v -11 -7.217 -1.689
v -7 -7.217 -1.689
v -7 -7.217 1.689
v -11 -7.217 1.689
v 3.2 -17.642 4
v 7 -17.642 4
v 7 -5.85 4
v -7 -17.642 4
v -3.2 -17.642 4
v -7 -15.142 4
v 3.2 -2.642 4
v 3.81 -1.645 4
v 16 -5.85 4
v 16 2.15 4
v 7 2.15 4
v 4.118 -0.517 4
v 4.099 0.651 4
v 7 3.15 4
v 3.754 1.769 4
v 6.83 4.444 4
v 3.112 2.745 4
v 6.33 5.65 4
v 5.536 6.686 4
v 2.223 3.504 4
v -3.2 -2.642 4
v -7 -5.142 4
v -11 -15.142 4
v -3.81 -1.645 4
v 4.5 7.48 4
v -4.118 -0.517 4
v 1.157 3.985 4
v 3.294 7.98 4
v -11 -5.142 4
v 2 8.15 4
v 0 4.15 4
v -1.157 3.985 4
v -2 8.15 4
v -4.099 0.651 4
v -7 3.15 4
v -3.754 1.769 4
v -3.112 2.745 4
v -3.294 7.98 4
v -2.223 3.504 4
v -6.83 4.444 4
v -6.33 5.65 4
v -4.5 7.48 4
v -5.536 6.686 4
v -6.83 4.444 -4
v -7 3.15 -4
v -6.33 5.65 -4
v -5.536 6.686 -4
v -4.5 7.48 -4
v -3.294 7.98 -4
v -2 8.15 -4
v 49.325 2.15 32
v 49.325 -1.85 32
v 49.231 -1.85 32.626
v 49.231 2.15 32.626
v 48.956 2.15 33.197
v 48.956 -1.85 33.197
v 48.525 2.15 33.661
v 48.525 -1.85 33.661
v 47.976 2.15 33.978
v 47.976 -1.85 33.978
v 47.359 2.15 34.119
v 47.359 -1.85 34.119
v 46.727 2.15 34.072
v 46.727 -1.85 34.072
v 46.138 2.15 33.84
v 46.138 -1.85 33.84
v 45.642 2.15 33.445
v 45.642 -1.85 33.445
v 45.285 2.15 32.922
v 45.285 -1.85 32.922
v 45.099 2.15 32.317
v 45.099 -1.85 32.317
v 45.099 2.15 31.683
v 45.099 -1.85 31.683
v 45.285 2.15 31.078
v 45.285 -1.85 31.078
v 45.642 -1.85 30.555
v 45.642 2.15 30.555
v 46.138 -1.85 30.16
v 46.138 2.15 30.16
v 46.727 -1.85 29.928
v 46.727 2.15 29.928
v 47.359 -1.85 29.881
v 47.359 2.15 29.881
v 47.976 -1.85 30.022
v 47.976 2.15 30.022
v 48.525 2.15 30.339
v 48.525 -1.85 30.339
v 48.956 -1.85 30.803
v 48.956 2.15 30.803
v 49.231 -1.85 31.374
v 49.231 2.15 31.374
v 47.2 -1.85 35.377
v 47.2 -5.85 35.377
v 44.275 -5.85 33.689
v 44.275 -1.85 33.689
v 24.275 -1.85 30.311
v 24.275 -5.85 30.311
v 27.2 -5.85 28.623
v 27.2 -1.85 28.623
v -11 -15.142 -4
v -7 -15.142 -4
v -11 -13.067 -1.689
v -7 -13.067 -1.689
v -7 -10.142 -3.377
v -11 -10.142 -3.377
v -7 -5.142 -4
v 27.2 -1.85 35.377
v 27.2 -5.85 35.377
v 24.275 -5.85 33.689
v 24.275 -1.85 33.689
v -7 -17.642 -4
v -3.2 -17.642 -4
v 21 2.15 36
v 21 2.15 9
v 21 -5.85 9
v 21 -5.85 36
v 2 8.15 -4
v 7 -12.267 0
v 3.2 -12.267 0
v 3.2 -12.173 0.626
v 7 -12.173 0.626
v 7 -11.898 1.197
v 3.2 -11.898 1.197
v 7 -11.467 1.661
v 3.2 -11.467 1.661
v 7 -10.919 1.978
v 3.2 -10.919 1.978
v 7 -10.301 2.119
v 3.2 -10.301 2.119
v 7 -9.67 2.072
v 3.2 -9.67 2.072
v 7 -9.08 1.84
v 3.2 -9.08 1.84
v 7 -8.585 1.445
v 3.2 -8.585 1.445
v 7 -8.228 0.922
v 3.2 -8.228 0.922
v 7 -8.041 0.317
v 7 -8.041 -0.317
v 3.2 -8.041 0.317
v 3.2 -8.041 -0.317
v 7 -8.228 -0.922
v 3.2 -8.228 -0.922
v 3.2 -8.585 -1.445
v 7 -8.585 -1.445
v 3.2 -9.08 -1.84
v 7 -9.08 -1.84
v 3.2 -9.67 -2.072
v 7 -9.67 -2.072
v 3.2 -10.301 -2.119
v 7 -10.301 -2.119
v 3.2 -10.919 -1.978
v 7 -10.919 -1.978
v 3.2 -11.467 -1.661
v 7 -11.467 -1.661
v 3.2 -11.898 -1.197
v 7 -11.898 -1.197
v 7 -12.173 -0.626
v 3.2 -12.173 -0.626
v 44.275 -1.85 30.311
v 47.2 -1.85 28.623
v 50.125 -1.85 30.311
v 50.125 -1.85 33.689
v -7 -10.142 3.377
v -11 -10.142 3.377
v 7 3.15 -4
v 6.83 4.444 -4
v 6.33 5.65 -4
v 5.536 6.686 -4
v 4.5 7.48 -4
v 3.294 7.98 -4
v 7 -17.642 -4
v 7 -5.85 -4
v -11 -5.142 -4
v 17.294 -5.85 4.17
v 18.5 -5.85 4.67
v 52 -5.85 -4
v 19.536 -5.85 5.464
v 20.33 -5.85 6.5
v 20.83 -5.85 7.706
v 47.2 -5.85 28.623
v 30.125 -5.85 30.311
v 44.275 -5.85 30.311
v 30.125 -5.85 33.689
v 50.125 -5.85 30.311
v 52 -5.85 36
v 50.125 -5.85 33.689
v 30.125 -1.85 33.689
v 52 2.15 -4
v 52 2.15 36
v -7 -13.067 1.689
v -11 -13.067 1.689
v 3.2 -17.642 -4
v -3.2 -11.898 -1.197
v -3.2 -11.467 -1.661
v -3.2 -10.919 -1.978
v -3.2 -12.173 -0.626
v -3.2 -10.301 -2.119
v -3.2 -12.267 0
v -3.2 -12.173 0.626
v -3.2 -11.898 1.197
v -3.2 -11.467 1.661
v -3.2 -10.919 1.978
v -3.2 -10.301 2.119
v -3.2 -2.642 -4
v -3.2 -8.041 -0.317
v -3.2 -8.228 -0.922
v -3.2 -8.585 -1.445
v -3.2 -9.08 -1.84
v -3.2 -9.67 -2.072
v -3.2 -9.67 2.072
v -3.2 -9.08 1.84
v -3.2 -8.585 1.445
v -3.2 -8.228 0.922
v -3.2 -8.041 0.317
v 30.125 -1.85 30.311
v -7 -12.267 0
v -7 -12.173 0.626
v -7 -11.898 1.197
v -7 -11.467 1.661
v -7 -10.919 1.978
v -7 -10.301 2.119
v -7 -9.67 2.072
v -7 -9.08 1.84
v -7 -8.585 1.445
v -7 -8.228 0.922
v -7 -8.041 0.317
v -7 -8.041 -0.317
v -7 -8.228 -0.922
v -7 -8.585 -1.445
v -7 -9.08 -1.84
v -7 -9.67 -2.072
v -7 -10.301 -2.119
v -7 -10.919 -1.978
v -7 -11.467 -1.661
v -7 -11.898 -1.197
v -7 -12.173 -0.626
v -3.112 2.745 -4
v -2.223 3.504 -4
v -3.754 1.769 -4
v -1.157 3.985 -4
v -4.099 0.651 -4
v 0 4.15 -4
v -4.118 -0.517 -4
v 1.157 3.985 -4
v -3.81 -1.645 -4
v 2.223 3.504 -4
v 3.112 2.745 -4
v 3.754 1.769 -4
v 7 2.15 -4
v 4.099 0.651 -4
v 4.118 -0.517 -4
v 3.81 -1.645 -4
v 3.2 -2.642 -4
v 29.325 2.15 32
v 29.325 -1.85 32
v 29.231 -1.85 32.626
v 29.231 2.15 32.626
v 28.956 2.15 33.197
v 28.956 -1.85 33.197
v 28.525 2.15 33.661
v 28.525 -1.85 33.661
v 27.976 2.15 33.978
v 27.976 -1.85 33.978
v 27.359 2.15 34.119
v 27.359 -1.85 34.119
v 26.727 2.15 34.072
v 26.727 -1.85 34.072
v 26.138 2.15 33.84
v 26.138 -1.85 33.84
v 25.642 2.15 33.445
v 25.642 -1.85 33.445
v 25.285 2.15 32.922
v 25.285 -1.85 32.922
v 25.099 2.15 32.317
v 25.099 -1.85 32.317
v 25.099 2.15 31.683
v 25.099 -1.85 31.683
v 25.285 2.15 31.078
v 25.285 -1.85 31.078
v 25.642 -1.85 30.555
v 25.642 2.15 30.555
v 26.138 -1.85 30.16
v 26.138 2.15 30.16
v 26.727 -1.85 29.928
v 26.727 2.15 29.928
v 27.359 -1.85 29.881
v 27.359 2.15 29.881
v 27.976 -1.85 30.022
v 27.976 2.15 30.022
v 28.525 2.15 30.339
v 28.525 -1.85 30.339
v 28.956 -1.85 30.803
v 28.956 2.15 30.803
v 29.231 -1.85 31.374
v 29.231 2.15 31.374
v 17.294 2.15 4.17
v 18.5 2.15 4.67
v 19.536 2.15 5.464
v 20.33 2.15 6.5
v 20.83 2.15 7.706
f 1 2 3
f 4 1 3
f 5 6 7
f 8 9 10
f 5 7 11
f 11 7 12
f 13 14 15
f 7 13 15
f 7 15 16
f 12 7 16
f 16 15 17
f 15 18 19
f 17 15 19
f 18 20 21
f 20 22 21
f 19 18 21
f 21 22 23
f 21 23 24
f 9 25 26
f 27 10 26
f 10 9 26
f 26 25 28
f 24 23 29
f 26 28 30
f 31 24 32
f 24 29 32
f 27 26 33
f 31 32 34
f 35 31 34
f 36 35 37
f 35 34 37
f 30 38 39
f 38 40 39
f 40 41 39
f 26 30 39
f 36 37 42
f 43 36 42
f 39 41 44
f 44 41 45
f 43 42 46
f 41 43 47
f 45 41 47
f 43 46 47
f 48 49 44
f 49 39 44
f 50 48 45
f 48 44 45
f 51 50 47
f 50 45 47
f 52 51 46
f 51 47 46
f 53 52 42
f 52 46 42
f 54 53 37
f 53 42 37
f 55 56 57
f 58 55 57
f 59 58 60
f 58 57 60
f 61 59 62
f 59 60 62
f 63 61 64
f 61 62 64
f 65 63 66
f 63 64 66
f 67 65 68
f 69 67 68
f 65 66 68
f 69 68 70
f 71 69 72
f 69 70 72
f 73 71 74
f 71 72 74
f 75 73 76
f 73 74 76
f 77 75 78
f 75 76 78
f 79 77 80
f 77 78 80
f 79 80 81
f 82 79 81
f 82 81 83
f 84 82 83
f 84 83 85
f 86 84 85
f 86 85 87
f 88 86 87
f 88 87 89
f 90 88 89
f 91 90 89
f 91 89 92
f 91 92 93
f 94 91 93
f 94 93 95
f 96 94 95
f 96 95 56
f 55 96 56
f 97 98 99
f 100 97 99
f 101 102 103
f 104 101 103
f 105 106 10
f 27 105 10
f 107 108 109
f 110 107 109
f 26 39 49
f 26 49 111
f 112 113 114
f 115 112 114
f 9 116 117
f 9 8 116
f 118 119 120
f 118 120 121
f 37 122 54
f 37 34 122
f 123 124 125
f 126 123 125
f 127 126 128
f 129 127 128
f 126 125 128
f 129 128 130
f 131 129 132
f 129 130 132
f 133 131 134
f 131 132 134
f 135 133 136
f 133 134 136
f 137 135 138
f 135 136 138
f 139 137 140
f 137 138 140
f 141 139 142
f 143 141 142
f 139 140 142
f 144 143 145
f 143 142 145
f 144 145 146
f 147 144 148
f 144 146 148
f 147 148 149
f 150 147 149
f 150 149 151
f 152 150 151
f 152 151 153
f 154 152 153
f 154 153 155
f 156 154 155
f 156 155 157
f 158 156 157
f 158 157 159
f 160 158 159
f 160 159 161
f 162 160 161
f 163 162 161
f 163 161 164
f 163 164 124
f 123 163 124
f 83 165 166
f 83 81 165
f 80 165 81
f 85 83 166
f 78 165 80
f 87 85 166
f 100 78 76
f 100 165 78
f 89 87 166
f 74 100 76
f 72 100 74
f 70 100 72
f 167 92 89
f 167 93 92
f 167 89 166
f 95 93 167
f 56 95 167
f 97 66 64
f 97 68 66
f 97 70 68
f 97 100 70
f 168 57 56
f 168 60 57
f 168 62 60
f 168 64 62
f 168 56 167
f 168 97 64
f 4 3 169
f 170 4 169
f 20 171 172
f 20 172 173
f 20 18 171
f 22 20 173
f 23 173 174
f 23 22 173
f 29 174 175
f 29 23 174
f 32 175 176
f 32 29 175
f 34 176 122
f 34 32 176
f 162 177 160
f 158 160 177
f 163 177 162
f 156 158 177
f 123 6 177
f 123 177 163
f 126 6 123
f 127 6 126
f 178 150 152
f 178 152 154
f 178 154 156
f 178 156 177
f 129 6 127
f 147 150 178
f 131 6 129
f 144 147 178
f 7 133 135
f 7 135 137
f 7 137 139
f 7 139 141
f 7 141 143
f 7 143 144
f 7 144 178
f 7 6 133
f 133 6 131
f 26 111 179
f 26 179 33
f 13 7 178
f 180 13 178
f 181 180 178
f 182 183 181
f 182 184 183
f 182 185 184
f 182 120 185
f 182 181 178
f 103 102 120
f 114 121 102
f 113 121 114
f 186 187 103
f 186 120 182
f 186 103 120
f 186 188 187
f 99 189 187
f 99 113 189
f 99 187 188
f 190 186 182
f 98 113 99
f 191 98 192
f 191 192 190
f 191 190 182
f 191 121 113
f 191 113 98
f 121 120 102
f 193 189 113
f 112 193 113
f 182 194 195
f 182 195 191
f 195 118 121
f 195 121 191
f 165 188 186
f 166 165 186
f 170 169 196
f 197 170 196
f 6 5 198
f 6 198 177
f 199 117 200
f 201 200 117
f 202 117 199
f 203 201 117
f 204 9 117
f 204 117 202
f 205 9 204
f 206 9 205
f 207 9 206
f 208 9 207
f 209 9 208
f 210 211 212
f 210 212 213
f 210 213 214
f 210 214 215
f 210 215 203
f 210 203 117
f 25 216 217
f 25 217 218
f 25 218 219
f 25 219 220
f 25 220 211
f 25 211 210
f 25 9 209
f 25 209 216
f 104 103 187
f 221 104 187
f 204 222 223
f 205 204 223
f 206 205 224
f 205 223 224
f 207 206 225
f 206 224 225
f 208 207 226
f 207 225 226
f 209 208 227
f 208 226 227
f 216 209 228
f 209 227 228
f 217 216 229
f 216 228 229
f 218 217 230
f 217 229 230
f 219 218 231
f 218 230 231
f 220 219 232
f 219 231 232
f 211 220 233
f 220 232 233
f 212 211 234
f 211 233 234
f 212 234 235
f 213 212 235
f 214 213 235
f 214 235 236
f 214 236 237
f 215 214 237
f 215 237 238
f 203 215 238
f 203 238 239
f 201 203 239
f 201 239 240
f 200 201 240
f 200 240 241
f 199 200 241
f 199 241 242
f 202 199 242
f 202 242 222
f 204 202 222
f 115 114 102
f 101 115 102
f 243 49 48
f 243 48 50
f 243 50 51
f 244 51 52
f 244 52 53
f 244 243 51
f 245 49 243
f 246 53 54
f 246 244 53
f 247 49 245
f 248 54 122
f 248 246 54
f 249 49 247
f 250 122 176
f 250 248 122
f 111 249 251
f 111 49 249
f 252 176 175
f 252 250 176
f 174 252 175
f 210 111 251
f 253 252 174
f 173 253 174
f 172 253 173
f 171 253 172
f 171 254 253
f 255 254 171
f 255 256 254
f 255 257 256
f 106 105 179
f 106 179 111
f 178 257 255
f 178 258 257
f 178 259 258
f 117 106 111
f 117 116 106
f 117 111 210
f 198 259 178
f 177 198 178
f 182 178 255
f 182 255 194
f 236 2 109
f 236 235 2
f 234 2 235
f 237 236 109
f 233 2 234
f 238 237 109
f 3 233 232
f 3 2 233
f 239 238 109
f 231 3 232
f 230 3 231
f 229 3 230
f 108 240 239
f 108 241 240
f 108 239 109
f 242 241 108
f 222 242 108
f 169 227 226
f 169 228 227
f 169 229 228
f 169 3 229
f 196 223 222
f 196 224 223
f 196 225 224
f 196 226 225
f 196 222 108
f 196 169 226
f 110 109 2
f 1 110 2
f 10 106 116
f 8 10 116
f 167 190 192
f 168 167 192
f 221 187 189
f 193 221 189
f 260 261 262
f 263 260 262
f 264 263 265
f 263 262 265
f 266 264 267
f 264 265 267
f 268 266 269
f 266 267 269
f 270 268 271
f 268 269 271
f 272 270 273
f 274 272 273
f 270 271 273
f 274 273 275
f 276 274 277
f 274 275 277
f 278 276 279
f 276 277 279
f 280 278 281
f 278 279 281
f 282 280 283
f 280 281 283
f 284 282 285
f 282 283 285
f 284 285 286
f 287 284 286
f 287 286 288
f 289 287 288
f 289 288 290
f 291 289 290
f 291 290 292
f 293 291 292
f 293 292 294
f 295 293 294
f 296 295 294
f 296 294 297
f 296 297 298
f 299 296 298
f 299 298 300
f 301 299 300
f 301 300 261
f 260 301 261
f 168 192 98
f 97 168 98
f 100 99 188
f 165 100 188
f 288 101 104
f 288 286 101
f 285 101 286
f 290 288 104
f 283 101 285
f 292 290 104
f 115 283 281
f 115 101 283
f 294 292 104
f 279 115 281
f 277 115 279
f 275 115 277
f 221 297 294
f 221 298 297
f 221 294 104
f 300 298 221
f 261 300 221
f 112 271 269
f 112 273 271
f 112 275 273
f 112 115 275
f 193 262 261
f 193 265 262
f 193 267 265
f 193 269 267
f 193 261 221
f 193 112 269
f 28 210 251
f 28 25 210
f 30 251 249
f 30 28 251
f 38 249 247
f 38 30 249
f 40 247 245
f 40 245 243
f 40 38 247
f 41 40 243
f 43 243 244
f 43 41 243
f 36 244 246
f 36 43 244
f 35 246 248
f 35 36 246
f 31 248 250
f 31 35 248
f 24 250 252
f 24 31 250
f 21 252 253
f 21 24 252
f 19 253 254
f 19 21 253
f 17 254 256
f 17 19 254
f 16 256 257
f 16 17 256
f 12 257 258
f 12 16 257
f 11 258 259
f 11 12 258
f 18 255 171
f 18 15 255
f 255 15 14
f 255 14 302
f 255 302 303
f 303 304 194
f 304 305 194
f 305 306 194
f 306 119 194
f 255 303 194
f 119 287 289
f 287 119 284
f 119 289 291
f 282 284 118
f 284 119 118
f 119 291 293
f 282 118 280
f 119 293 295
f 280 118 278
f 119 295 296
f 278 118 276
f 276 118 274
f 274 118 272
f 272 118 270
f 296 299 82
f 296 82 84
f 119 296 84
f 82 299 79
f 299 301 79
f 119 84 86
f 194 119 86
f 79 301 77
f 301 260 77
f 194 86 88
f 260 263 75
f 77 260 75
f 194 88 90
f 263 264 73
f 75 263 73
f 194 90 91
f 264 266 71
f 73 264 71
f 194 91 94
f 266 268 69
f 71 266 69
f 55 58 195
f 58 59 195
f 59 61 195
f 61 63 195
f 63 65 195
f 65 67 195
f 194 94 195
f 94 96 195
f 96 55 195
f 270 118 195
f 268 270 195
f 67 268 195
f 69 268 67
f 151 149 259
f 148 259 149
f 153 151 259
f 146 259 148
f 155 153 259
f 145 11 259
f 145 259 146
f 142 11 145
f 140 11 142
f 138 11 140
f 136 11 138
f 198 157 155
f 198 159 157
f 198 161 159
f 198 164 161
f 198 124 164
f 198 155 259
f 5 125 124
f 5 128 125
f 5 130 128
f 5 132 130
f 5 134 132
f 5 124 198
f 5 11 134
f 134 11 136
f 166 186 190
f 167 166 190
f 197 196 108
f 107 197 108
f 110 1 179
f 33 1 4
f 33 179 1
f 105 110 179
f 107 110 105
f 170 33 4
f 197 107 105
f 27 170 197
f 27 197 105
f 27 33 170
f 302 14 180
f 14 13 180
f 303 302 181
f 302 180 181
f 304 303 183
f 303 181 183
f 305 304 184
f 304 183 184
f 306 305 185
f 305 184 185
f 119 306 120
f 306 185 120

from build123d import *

# Parameters (mm, degrees)
F1_DEPTH  = 4
F2_R      = 5
F3_R      = 2.125
F4_DEPTH  = 25
F5_W      = 10
F5_H      = 8
F6_DEPTH  = 4
F7_W      = 45
F7_H      = 8
F8_DEPTH  = 36
F9_W      = 45
F9_H      = 8
F10_DEPTH = 4
F11_R     = 2.125
F12_DEPTH = 25
F14_DEPTH = 4
F15_W     = 14
F15_H     = 32
F16_DEPTH = 25
F17_R     = 5


with BuildPart() as f1:
    # F0 (on Top) → F1 (new body, symmetric)
    with BuildSketch(Plane.XY):
        with BuildLine():
            ThreePointArc((-3.2, -2.642442), (0, 4.15), (3.2, -2.642442))
            Line((3.2, -2.642442), (3.2, -17.642442))
            Line((3.2, -17.642442), (7, -17.642442))
            Line((7, -17.642442), (7, -2.65))
            Line((7, -2.65), (7, -1.85))
            Line((7, -1.85), (7, 2.35))
            Line((7, 2.35), (7, 8.15))
            Line((7, 8.15), (-7, 8.15))
            Line((-7, 8.15), (-7, 3.15))
            Line((-7, 3.15), (-7, -17.642442))
            Line((-7, -17.642442), (-3.2, -17.642442))
            Line((-3.2, -17.642442), (-3.2, -2.642442))
        make_face()
    extrude(amount=F1_DEPTH, both=True)

    # F2
    f2_edges = [f1.edges().sort_by_distance(p)[0] for p in [
        (-7, 8.15, 0),
    ]]
    fillet(f2_edges, radius=F2_R)

    # F3 (on face) → F4 (cut)
    with BuildSketch(Plane(origin=(-7, 0, 0), x_dir=(0, -1, 0), z_dir=(-1, 0, 0))):
        with Locations((10.142442, 0)):
            Circle(F3_R)
    extrude(amount=-F4_DEPTH, mode=Mode.SUBTRACT)

    # F5 (on face) → F6 (join)
    with BuildSketch(Plane(origin=(-7, 0, 0), x_dir=(0, -1, 0), z_dir=(-1, 0, 0))):
        with Locations((10.142442, 0)):
            Rectangle(F5_W, F5_H)
        Polygon((10.142442, 3.377499), (13.067442, 1.68875), (13.067442, -1.68875), (10.142442, -3.377499), (7.217442, -1.68875), (7.217442, 1.68875), align=None, mode=Mode.SUBTRACT)
    extrude(amount=F6_DEPTH)

    # F7 (on Top) → F8 (join)
    with BuildSketch(Plane.XY):
        with Locations((29.5, -1.85)):
            Rectangle(F7_W, F7_H)
    extrude(amount=F8_DEPTH)

    # F9 (on face) → F10 (join)
    with BuildSketch(Plane(origin=(0, 0, 0), x_dir=(1, 0, 0), z_dir=(0, 0, -1))):
        with Locations((29.5, 1.85)):
            Rectangle(F9_W, F9_H)
    extrude(amount=F10_DEPTH)

    # F11 (on face) → F12 (cut)
    with BuildSketch(Plane.XZ.offset(5.85)):
        with Locations((27.2, 32)):
            Circle(F11_R)
        with Locations((47.2, 32)):
            Circle(F11_R)
    extrude(amount=-F12_DEPTH, mode=Mode.SUBTRACT)

    # F13 (on face) → F14 (cut)
    with BuildSketch(Plane.XZ.offset(5.85)):
        Polygon((30.125, 30.31125), (30.125, 33.68875), (27.2, 35.377499), (24.275, 33.68875), (24.275, 30.31125), (27.2, 28.622501), align=None)
        Polygon((44.275, 33.68875), (44.275, 30.31125), (47.2, 28.622501), (50.125, 30.31125), (50.125, 33.68875), (47.2, 35.377499), align=None)
    extrude(amount=-F14_DEPTH, mode=Mode.SUBTRACT)

    # F15 (on face) → F16 (cut)
    with BuildSketch(Plane(origin=(0, 2.15, 0), x_dir=(-1, 0, 0), z_dir=(0, 1, 0))):
        with Locations((-14, 20)):
            Rectangle(F15_W, F15_H)
    extrude(amount=-F16_DEPTH, mode=Mode.SUBTRACT)

    # F17
    f17_edges = [f1.edges().sort_by_distance(p)[0] for p in [
        (21, -1.85, 4),
        (7, 8.15, 0),
    ]]
    fillet(f17_edges, radius=F17_R)


solid = f1.part
